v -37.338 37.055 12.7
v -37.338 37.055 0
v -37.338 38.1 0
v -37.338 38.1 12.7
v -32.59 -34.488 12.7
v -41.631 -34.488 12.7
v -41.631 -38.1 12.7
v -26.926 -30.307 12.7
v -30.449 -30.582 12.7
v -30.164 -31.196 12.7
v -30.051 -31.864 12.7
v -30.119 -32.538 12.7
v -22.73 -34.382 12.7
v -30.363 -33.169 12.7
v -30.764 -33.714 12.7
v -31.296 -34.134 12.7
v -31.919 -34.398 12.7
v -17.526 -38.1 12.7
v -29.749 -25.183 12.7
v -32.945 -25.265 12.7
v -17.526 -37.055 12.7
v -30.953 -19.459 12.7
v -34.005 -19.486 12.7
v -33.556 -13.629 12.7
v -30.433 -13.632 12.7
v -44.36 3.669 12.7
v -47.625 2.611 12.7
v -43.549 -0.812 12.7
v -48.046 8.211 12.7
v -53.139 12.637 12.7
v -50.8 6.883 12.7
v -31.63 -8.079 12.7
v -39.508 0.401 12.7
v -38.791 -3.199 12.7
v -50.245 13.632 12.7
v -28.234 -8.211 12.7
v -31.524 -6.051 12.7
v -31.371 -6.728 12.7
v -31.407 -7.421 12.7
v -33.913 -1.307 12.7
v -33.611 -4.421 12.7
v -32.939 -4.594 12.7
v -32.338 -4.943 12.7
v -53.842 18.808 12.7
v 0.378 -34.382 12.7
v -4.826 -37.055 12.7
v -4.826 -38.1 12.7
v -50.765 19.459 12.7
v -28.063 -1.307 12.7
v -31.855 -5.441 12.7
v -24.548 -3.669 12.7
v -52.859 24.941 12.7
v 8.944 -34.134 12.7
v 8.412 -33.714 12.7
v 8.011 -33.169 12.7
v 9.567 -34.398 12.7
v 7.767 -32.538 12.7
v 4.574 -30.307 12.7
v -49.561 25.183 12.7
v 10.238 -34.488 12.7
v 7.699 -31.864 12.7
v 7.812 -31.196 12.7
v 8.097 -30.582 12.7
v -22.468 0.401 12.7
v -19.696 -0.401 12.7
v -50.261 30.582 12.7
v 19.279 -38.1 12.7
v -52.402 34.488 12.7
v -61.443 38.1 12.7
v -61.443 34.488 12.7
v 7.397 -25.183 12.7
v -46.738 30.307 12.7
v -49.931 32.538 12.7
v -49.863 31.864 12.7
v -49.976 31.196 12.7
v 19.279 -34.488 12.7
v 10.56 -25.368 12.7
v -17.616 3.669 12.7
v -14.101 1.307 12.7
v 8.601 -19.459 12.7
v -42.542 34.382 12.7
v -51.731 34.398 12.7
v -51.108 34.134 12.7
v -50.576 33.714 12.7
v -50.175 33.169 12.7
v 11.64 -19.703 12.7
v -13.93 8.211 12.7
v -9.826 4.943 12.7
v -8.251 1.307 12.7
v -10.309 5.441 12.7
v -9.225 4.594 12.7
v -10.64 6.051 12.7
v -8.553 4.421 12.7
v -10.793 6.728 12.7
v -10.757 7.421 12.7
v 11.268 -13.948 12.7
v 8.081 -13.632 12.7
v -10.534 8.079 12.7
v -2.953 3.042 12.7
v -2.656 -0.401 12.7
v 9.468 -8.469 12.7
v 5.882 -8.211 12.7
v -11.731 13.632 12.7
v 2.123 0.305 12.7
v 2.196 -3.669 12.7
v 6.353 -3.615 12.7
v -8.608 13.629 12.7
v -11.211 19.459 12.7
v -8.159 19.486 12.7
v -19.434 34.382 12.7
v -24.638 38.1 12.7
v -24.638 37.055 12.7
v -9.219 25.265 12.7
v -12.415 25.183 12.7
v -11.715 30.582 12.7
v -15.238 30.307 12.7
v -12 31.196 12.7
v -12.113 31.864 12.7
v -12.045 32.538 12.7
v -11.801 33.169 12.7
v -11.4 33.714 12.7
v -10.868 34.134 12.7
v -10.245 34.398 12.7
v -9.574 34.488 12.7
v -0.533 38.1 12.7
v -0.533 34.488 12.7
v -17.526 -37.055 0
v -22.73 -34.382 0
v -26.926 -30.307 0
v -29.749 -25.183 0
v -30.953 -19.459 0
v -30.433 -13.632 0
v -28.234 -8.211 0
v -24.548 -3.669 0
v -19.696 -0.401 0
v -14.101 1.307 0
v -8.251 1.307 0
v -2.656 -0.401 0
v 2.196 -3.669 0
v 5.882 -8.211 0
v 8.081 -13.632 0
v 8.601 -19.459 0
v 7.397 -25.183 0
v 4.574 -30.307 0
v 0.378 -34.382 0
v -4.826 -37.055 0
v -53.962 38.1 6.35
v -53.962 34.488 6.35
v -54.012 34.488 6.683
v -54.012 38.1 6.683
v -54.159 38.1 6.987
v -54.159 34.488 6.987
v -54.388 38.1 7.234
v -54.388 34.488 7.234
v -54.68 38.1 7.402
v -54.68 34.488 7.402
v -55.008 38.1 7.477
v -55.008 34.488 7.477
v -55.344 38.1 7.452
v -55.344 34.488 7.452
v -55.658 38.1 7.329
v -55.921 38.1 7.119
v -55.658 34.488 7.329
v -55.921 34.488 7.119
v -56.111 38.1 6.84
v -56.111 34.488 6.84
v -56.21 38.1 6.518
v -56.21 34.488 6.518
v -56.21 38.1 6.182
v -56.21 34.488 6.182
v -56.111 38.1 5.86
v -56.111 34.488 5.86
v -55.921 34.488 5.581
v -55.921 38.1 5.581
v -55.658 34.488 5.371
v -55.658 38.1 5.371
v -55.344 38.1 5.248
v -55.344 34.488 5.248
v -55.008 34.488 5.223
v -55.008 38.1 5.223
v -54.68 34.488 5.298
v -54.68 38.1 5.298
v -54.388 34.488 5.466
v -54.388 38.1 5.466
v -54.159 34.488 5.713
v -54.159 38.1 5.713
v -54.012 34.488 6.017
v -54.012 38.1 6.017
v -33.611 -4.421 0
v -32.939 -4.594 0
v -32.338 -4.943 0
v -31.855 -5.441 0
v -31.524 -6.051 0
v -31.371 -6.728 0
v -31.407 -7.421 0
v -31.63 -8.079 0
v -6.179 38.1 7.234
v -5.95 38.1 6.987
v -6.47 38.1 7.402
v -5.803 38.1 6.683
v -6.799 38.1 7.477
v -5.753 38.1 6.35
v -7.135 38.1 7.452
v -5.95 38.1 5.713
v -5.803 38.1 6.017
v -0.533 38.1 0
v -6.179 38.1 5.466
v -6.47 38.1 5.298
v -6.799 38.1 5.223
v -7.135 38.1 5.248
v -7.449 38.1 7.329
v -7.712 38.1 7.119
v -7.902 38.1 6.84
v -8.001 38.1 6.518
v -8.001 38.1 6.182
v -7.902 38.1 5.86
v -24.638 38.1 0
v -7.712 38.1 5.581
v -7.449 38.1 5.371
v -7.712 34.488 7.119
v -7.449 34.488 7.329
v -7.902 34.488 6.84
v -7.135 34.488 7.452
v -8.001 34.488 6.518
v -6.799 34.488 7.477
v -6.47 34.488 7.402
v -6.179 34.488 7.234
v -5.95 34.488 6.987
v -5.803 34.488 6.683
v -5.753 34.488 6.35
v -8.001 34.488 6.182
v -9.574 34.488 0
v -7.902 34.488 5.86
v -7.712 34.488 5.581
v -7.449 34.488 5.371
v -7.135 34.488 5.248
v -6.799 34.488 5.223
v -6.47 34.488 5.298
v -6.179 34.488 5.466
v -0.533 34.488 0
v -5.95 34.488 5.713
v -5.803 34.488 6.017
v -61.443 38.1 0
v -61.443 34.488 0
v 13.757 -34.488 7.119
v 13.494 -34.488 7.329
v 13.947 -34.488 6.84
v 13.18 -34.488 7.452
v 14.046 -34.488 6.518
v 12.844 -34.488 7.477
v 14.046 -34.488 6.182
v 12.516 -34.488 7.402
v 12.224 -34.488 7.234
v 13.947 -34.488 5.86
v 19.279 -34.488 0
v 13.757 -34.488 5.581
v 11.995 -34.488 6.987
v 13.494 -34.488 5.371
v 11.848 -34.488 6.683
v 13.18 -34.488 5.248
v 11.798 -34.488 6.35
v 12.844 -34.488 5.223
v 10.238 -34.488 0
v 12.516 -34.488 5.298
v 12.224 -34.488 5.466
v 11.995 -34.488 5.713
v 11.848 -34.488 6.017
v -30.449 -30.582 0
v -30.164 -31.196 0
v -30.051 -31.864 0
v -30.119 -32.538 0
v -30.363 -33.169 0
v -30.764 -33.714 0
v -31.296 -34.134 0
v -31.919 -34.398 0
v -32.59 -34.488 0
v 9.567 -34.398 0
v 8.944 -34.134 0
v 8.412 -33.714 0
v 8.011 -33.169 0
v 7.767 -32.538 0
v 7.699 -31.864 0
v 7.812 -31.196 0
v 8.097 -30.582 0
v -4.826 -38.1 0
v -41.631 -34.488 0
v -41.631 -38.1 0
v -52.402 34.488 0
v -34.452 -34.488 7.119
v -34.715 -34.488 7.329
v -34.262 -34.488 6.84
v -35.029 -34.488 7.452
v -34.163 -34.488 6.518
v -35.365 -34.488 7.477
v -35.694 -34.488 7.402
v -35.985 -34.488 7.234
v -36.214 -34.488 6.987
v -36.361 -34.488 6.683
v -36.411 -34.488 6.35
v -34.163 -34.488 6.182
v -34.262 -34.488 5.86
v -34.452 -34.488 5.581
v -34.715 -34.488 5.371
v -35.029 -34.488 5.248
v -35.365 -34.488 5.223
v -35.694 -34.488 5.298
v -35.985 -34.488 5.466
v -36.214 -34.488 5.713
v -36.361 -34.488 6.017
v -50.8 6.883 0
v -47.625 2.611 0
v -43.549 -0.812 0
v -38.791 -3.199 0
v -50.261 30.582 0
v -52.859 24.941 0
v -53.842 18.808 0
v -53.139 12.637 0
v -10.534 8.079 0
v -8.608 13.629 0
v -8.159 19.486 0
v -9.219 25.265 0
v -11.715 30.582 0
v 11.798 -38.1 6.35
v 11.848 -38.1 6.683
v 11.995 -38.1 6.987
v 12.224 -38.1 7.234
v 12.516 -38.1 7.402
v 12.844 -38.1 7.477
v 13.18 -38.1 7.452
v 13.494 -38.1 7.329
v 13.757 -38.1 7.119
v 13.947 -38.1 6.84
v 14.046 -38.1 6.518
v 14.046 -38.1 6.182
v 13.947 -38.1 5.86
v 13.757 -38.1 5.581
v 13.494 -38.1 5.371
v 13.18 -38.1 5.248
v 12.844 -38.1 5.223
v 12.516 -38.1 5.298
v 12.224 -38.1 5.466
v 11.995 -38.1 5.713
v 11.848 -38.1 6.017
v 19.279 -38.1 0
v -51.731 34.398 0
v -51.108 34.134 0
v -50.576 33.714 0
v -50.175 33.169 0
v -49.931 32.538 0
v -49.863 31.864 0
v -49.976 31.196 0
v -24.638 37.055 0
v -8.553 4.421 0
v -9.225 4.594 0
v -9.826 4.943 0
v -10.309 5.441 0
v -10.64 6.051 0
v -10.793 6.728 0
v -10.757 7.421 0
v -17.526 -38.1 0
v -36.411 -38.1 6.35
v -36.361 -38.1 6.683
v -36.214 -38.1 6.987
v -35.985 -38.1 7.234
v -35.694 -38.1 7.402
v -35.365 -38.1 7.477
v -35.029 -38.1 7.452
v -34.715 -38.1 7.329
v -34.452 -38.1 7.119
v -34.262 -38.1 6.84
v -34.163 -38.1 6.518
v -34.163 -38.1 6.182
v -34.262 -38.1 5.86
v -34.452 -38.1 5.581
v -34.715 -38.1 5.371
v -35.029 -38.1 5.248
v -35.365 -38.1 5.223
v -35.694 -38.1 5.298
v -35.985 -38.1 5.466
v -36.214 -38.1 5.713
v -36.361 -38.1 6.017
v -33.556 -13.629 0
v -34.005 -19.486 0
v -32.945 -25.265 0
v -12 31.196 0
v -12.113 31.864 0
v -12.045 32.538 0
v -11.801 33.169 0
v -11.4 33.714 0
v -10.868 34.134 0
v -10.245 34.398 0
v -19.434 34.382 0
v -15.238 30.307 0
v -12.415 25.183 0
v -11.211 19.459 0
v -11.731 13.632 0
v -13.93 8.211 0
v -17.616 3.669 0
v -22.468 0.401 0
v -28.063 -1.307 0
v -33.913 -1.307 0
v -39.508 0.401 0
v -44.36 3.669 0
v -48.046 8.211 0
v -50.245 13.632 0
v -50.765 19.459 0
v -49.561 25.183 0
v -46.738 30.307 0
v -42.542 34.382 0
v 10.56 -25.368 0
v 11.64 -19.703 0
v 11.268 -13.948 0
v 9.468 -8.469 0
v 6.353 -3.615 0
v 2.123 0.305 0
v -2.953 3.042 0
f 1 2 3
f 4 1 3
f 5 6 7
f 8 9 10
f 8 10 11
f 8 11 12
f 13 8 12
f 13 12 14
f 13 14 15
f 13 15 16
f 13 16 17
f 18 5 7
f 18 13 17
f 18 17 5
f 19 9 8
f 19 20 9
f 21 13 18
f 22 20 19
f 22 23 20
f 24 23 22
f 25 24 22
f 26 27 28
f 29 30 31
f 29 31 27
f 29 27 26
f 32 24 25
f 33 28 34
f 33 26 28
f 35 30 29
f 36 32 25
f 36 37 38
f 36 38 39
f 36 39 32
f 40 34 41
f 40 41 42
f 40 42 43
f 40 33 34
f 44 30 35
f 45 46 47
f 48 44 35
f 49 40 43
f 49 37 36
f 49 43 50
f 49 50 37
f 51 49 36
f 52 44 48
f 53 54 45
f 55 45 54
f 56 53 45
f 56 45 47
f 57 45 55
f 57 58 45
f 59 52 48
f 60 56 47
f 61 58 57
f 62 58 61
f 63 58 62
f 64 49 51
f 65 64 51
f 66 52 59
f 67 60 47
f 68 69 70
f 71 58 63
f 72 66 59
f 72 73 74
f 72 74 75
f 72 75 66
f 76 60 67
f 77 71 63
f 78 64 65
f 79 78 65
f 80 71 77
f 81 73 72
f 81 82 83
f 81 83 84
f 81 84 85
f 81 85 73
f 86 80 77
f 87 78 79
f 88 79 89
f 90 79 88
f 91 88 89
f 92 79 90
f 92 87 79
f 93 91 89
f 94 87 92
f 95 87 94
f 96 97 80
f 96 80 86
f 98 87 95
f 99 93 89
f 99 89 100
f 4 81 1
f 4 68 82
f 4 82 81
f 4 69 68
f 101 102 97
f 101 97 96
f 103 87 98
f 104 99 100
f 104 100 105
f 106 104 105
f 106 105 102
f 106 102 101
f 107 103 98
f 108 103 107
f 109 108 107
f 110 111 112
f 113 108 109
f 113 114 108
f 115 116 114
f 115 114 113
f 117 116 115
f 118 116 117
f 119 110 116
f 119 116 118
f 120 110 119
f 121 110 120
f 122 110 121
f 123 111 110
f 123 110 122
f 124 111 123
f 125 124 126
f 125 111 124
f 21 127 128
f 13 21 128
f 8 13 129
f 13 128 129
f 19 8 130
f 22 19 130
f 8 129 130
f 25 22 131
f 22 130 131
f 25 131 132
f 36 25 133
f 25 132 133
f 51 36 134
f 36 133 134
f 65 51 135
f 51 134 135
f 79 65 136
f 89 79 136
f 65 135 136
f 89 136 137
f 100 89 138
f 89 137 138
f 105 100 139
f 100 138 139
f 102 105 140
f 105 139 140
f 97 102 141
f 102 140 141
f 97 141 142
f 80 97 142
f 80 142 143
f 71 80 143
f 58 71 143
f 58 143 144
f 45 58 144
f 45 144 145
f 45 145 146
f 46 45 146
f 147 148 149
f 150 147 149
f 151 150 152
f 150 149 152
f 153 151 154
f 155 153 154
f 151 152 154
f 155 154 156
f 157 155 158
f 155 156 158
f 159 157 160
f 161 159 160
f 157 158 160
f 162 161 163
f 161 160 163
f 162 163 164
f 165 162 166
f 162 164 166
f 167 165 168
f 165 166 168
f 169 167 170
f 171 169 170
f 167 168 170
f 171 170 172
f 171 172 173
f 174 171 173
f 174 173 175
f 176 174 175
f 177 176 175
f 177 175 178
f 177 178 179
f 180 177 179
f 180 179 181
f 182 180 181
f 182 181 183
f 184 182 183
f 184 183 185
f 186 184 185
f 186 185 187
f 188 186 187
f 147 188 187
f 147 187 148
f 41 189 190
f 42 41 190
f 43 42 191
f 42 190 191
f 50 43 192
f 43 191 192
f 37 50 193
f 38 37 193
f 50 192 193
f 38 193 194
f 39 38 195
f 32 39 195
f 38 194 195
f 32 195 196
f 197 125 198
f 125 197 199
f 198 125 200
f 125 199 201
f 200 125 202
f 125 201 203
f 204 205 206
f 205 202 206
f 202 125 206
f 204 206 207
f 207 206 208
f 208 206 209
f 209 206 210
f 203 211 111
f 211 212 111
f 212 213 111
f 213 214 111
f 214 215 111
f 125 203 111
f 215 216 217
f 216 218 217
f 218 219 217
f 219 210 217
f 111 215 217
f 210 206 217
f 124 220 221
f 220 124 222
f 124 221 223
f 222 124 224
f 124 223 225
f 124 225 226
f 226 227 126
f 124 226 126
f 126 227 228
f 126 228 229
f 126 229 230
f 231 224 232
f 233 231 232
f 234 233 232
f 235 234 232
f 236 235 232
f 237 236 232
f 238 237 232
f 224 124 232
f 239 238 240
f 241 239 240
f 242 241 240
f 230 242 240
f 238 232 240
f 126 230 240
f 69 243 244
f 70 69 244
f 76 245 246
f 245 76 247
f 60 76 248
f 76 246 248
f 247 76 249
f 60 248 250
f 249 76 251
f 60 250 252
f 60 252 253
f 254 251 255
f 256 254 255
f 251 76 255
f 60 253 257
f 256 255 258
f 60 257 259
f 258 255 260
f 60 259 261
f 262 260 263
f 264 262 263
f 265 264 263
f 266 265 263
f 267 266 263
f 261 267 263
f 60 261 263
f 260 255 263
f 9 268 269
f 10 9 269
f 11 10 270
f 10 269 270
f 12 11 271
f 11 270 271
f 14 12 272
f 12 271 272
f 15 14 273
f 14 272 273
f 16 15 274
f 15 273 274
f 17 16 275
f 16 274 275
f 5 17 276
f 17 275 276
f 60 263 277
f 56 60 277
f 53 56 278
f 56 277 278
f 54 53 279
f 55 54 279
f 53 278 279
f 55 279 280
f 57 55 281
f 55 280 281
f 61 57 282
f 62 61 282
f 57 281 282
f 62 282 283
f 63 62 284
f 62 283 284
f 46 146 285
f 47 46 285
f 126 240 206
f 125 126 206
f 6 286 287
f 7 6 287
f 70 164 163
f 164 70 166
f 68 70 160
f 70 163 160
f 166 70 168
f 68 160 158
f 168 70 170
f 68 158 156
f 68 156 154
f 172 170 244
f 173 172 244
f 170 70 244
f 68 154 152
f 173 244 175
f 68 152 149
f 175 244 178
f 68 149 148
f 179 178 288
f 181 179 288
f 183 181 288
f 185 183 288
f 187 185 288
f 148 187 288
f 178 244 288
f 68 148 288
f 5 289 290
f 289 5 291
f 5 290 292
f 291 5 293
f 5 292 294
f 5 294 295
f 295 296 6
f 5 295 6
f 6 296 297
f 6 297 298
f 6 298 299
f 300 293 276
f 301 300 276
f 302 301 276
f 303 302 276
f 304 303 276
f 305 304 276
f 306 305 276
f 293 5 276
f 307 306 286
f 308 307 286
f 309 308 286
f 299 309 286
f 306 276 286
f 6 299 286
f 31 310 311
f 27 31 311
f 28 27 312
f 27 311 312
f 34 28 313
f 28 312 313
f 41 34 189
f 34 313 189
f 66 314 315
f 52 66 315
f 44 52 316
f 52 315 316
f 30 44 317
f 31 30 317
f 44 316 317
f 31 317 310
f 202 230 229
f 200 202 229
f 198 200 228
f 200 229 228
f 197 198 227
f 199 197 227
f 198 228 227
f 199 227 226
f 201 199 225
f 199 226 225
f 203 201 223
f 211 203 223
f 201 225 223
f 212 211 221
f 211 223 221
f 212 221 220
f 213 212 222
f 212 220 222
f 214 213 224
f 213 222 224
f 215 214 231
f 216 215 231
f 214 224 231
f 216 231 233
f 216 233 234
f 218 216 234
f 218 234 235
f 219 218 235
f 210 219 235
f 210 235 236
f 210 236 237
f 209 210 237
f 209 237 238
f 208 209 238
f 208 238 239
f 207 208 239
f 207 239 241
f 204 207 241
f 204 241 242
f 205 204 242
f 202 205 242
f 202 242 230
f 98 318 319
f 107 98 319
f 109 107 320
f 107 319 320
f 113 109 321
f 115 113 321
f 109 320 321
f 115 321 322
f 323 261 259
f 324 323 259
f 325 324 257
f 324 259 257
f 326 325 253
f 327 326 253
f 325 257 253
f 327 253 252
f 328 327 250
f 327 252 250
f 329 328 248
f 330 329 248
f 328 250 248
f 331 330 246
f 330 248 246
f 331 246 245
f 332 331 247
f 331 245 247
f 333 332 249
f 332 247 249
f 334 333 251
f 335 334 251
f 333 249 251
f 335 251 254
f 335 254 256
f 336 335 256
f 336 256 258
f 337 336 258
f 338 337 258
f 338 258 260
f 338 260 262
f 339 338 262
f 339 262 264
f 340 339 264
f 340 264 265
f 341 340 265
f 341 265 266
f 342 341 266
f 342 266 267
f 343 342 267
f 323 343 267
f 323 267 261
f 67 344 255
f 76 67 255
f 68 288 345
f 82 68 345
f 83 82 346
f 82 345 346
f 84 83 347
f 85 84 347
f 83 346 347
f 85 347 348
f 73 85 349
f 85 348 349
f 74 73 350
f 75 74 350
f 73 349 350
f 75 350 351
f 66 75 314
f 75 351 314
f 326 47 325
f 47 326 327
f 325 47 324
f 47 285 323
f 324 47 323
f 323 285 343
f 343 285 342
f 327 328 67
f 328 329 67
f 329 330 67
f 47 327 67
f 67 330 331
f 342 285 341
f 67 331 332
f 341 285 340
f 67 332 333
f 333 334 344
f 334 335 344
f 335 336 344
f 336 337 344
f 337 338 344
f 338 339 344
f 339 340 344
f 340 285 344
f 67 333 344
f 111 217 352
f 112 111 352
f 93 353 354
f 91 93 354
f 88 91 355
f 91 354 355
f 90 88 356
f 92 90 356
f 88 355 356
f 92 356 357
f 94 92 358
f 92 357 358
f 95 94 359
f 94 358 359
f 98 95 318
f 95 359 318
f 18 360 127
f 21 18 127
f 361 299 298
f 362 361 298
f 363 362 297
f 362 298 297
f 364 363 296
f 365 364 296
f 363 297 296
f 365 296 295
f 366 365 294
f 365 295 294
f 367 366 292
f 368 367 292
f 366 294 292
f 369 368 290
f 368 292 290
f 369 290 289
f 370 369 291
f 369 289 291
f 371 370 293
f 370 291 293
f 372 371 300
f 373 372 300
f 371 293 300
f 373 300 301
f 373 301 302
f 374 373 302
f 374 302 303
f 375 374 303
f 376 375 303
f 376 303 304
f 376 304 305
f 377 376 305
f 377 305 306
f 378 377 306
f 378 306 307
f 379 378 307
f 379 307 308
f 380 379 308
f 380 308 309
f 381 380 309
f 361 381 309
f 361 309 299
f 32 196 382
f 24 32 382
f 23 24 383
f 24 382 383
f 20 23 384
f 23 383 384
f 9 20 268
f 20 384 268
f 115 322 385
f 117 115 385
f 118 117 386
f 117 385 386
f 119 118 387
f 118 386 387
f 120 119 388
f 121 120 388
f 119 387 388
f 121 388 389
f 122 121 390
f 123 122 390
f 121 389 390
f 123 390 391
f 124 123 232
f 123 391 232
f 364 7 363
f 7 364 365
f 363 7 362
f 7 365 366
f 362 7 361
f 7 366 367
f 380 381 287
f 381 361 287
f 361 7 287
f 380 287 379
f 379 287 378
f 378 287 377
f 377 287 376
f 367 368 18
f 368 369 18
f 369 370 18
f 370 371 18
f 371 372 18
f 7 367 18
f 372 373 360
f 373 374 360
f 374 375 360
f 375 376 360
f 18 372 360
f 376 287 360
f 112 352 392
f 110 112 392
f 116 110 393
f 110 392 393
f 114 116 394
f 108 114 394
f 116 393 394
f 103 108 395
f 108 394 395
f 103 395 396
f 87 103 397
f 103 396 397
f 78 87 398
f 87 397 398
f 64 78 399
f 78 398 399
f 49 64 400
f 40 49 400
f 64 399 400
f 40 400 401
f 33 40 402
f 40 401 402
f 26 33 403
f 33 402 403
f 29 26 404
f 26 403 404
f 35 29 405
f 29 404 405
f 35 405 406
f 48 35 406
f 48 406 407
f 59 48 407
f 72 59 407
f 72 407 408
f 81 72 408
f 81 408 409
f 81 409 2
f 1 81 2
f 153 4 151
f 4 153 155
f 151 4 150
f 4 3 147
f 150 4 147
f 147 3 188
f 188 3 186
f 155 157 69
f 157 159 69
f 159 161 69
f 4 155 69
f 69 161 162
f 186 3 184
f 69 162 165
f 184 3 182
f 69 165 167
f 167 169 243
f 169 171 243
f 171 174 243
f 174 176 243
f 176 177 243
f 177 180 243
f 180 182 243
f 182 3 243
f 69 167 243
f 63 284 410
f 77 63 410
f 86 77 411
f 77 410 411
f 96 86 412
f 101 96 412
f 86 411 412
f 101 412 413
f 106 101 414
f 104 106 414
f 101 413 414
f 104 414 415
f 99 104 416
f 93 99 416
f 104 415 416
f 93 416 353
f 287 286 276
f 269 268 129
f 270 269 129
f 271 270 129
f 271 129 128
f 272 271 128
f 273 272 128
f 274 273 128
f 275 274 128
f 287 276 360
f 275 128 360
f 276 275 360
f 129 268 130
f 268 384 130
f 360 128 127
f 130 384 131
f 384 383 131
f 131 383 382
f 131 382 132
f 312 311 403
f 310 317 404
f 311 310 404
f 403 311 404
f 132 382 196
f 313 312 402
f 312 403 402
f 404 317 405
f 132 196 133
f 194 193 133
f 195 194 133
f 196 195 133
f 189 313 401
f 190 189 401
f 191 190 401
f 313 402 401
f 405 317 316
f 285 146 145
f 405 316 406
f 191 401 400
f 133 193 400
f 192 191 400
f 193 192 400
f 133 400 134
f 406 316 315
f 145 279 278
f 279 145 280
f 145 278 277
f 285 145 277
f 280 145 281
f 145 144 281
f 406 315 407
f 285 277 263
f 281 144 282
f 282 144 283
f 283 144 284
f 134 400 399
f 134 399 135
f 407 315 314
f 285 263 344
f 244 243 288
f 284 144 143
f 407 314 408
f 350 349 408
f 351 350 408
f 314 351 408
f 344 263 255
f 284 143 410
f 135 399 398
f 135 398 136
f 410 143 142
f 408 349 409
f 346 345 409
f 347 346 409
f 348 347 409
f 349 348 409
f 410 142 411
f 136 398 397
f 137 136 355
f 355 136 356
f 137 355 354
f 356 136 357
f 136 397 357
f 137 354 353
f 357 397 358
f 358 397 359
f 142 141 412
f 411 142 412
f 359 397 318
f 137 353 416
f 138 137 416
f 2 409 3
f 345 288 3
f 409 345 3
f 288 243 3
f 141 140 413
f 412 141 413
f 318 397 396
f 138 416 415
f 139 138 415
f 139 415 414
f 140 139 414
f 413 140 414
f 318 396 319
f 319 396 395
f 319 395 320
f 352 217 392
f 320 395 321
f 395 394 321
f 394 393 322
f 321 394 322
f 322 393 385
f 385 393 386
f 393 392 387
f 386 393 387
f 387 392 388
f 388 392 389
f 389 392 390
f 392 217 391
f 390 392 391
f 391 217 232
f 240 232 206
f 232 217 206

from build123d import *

# Parameters (mm, degrees)
F1_DEPTH       = 12.7
F6_D           = 2.2606
F6_DEPTH       = 12.7
F6_TIP         = 0.6791527577
F6_ON_F5_D     = 2.2606
F6_ON_F5_DEPTH = 12.7
F6_ON_F5_TIP   = 0.6791527577
F6_ON_F2_D     = 2.2606
F6_ON_F2_DEPTH = 12.7
F6_ON_F2_TIP   = 0.6791527577
F6_ON_F3_D     = 2.2606
F6_ON_F3_DEPTH = 12.7
F6_ON_F3_TIP   = 0.6791527577


with BuildPart() as f1:
    # F0 (on Top) → F1 (new body)
    with BuildSketch(Plane.XY):
        with BuildLine():
            Line((0.2285717149, -38.1), (19.2785717149, -38.1))
            Line((19.2785717149, -38.1), (19.2785717149, -34.4883422186))
            Line((19.2785717149, -34.4883422186), (10.2378985351, -34.4883422186))
            ThreePointArc((10.2378985351, -34.4883422186), (8.0106438434, -33.1693813409), (8.0965086816, -30.5823079967))
            ThreePointArc((8.0965086816, -30.5823079967), (9.4676308494, -8.4686260202), (-8.553227146, 4.4210436293))
            ThreePointArc((-8.553227146, 4.4210436293), (-10.495209535, 5.7345115019), (-10.534427146, 8.0786436293))
            ThreePointArc((-10.534427146, 8.0786436293), (-8.1594188782, 19.4861168414), (-11.7154913184, 30.5823079967))
            ThreePointArc((-11.7154913184, 30.5823079967), (-11.8013561566, 33.1693813409), (-9.5741014649, 34.4883422186))
            Line((-9.5741014649, 34.4883422186), (-0.5334282851, 34.4883422186))
            Line((-0.5334282851, 34.4883422186), (-0.5334282851, 38.1))
            Line((-0.5334282851, 38.1), (-24.638, 38.1))
            Line((-24.638, 38.1), (-24.638, 37.0548016455))
            ThreePointArc((-24.638, 37.0548016455), (-30.988, -1.524), (-37.338, 37.0548016455))
            Line((-37.338, 37.0548016455), (-37.338, 38.1))
            Line((-37.338, 38.1), (-61.4425717149, 38.1))
            Line((-61.4425717149, 38.1), (-61.4425717149, 34.4883422186))
            Line((-61.4425717149, 34.4883422186), (-52.4018985351, 34.4883422186))
            ThreePointArc((-52.4018985351, 34.4883422186), (-50.1746438434, 33.1693813409), (-50.2605086816, 30.5823079967))
            ThreePointArc((-50.2605086816, 30.5823079967), (-53.8420790586, 18.8082599192), (-50.8, 6.8834282851))
            ThreePointArc((-50.8, 6.8834282851), (-43.5489525741, -0.8117924185), (-33.610772854, -4.4210436293))
            ThreePointArc((-33.610772854, -4.4210436293), (-31.668790465, -5.7345115019), (-31.629572854, -8.0786436293))
            ThreePointArc((-31.629572854, -8.0786436293), (-34.0045811218, -19.4861168414), (-30.4485086816, -30.5823079967))
            ThreePointArc((-30.4485086816, -30.5823079967), (-30.3626438434, -33.1693813409), (-32.5898985351, -34.4883422186))
            Line((-32.5898985351, -34.4883422186), (-41.6305717149, -34.4883422186))
            Line((-41.6305717149, -34.4883422186), (-41.6305717149, -38.1))
            Line((-41.6305717149, -38.1), (-22.5805717149, -38.1))
            Line((-22.5805717149, -38.1), (-17.526, -38.1))
            Line((-17.526, -38.1), (-17.526, -37.0548016455))
            ThreePointArc((-17.526, -37.0548016455), (-11.176, 1.524), (-4.826, -37.0548016455))
            Line((-4.826, -37.0548016455), (-4.826, -38.1))
            Line((-4.826, -38.1), (0.2285717149, -38.1))
        make_face()
    extrude(amount=F1_DEPTH)

    # F6
    with Locations(Plane(origin=(0, 38.1, 0), x_dir=(-1, 0, 0), z_dir=(0, 1, 0))):
        with Locations((55.0925717149, 6.35)):
            Hole(F6_D / 2, depth=F6_DEPTH)
            with Locations((0, 0, -(F6_DEPTH + F6_TIP / 2))):  # 118° drill point
                Cone(0, F6_D / 2, F6_TIP, mode=Mode.SUBTRACT)

    # F6 on F5
    with Locations(Plane(origin=(0, 38.1, 0), x_dir=(-1, 0, 0), z_dir=(0, 1, 0))):
        with Locations((6.8834282851, 6.35)):
            Hole(F6_ON_F5_D / 2, depth=F6_ON_F5_DEPTH)
            with Locations((0, 0, -(F6_ON_F5_DEPTH + F6_ON_F5_TIP / 2))):  # 118° drill point
                Cone(0, F6_ON_F5_D / 2, F6_ON_F5_TIP, mode=Mode.SUBTRACT)

    # F6 on F2
    with Locations(Plane.XZ.offset(38.1)):
        with Locations((-35.2805717149, 6.35)):
            Hole(F6_ON_F2_D / 2, depth=F6_ON_F2_DEPTH)
            with Locations((0, 0, -(F6_ON_F2_DEPTH + F6_ON_F2_TIP / 2))):  # 118° drill point
                Cone(0, F6_ON_F2_D / 2, F6_ON_F2_TIP, mode=Mode.SUBTRACT)

    # F6 on F3
    with Locations(Plane.XZ.offset(38.1)):
        with Locations((12.9285717149, 6.35)):
            Hole(F6_ON_F3_D / 2, depth=F6_ON_F3_DEPTH)
            with Locations((0, 0, -(F6_ON_F3_DEPTH + F6_ON_F3_TIP / 2))):  # 118° drill point
                Cone(0, F6_ON_F3_D / 2, F6_ON_F3_TIP, mode=Mode.SUBTRACT)


solid = f1.part
